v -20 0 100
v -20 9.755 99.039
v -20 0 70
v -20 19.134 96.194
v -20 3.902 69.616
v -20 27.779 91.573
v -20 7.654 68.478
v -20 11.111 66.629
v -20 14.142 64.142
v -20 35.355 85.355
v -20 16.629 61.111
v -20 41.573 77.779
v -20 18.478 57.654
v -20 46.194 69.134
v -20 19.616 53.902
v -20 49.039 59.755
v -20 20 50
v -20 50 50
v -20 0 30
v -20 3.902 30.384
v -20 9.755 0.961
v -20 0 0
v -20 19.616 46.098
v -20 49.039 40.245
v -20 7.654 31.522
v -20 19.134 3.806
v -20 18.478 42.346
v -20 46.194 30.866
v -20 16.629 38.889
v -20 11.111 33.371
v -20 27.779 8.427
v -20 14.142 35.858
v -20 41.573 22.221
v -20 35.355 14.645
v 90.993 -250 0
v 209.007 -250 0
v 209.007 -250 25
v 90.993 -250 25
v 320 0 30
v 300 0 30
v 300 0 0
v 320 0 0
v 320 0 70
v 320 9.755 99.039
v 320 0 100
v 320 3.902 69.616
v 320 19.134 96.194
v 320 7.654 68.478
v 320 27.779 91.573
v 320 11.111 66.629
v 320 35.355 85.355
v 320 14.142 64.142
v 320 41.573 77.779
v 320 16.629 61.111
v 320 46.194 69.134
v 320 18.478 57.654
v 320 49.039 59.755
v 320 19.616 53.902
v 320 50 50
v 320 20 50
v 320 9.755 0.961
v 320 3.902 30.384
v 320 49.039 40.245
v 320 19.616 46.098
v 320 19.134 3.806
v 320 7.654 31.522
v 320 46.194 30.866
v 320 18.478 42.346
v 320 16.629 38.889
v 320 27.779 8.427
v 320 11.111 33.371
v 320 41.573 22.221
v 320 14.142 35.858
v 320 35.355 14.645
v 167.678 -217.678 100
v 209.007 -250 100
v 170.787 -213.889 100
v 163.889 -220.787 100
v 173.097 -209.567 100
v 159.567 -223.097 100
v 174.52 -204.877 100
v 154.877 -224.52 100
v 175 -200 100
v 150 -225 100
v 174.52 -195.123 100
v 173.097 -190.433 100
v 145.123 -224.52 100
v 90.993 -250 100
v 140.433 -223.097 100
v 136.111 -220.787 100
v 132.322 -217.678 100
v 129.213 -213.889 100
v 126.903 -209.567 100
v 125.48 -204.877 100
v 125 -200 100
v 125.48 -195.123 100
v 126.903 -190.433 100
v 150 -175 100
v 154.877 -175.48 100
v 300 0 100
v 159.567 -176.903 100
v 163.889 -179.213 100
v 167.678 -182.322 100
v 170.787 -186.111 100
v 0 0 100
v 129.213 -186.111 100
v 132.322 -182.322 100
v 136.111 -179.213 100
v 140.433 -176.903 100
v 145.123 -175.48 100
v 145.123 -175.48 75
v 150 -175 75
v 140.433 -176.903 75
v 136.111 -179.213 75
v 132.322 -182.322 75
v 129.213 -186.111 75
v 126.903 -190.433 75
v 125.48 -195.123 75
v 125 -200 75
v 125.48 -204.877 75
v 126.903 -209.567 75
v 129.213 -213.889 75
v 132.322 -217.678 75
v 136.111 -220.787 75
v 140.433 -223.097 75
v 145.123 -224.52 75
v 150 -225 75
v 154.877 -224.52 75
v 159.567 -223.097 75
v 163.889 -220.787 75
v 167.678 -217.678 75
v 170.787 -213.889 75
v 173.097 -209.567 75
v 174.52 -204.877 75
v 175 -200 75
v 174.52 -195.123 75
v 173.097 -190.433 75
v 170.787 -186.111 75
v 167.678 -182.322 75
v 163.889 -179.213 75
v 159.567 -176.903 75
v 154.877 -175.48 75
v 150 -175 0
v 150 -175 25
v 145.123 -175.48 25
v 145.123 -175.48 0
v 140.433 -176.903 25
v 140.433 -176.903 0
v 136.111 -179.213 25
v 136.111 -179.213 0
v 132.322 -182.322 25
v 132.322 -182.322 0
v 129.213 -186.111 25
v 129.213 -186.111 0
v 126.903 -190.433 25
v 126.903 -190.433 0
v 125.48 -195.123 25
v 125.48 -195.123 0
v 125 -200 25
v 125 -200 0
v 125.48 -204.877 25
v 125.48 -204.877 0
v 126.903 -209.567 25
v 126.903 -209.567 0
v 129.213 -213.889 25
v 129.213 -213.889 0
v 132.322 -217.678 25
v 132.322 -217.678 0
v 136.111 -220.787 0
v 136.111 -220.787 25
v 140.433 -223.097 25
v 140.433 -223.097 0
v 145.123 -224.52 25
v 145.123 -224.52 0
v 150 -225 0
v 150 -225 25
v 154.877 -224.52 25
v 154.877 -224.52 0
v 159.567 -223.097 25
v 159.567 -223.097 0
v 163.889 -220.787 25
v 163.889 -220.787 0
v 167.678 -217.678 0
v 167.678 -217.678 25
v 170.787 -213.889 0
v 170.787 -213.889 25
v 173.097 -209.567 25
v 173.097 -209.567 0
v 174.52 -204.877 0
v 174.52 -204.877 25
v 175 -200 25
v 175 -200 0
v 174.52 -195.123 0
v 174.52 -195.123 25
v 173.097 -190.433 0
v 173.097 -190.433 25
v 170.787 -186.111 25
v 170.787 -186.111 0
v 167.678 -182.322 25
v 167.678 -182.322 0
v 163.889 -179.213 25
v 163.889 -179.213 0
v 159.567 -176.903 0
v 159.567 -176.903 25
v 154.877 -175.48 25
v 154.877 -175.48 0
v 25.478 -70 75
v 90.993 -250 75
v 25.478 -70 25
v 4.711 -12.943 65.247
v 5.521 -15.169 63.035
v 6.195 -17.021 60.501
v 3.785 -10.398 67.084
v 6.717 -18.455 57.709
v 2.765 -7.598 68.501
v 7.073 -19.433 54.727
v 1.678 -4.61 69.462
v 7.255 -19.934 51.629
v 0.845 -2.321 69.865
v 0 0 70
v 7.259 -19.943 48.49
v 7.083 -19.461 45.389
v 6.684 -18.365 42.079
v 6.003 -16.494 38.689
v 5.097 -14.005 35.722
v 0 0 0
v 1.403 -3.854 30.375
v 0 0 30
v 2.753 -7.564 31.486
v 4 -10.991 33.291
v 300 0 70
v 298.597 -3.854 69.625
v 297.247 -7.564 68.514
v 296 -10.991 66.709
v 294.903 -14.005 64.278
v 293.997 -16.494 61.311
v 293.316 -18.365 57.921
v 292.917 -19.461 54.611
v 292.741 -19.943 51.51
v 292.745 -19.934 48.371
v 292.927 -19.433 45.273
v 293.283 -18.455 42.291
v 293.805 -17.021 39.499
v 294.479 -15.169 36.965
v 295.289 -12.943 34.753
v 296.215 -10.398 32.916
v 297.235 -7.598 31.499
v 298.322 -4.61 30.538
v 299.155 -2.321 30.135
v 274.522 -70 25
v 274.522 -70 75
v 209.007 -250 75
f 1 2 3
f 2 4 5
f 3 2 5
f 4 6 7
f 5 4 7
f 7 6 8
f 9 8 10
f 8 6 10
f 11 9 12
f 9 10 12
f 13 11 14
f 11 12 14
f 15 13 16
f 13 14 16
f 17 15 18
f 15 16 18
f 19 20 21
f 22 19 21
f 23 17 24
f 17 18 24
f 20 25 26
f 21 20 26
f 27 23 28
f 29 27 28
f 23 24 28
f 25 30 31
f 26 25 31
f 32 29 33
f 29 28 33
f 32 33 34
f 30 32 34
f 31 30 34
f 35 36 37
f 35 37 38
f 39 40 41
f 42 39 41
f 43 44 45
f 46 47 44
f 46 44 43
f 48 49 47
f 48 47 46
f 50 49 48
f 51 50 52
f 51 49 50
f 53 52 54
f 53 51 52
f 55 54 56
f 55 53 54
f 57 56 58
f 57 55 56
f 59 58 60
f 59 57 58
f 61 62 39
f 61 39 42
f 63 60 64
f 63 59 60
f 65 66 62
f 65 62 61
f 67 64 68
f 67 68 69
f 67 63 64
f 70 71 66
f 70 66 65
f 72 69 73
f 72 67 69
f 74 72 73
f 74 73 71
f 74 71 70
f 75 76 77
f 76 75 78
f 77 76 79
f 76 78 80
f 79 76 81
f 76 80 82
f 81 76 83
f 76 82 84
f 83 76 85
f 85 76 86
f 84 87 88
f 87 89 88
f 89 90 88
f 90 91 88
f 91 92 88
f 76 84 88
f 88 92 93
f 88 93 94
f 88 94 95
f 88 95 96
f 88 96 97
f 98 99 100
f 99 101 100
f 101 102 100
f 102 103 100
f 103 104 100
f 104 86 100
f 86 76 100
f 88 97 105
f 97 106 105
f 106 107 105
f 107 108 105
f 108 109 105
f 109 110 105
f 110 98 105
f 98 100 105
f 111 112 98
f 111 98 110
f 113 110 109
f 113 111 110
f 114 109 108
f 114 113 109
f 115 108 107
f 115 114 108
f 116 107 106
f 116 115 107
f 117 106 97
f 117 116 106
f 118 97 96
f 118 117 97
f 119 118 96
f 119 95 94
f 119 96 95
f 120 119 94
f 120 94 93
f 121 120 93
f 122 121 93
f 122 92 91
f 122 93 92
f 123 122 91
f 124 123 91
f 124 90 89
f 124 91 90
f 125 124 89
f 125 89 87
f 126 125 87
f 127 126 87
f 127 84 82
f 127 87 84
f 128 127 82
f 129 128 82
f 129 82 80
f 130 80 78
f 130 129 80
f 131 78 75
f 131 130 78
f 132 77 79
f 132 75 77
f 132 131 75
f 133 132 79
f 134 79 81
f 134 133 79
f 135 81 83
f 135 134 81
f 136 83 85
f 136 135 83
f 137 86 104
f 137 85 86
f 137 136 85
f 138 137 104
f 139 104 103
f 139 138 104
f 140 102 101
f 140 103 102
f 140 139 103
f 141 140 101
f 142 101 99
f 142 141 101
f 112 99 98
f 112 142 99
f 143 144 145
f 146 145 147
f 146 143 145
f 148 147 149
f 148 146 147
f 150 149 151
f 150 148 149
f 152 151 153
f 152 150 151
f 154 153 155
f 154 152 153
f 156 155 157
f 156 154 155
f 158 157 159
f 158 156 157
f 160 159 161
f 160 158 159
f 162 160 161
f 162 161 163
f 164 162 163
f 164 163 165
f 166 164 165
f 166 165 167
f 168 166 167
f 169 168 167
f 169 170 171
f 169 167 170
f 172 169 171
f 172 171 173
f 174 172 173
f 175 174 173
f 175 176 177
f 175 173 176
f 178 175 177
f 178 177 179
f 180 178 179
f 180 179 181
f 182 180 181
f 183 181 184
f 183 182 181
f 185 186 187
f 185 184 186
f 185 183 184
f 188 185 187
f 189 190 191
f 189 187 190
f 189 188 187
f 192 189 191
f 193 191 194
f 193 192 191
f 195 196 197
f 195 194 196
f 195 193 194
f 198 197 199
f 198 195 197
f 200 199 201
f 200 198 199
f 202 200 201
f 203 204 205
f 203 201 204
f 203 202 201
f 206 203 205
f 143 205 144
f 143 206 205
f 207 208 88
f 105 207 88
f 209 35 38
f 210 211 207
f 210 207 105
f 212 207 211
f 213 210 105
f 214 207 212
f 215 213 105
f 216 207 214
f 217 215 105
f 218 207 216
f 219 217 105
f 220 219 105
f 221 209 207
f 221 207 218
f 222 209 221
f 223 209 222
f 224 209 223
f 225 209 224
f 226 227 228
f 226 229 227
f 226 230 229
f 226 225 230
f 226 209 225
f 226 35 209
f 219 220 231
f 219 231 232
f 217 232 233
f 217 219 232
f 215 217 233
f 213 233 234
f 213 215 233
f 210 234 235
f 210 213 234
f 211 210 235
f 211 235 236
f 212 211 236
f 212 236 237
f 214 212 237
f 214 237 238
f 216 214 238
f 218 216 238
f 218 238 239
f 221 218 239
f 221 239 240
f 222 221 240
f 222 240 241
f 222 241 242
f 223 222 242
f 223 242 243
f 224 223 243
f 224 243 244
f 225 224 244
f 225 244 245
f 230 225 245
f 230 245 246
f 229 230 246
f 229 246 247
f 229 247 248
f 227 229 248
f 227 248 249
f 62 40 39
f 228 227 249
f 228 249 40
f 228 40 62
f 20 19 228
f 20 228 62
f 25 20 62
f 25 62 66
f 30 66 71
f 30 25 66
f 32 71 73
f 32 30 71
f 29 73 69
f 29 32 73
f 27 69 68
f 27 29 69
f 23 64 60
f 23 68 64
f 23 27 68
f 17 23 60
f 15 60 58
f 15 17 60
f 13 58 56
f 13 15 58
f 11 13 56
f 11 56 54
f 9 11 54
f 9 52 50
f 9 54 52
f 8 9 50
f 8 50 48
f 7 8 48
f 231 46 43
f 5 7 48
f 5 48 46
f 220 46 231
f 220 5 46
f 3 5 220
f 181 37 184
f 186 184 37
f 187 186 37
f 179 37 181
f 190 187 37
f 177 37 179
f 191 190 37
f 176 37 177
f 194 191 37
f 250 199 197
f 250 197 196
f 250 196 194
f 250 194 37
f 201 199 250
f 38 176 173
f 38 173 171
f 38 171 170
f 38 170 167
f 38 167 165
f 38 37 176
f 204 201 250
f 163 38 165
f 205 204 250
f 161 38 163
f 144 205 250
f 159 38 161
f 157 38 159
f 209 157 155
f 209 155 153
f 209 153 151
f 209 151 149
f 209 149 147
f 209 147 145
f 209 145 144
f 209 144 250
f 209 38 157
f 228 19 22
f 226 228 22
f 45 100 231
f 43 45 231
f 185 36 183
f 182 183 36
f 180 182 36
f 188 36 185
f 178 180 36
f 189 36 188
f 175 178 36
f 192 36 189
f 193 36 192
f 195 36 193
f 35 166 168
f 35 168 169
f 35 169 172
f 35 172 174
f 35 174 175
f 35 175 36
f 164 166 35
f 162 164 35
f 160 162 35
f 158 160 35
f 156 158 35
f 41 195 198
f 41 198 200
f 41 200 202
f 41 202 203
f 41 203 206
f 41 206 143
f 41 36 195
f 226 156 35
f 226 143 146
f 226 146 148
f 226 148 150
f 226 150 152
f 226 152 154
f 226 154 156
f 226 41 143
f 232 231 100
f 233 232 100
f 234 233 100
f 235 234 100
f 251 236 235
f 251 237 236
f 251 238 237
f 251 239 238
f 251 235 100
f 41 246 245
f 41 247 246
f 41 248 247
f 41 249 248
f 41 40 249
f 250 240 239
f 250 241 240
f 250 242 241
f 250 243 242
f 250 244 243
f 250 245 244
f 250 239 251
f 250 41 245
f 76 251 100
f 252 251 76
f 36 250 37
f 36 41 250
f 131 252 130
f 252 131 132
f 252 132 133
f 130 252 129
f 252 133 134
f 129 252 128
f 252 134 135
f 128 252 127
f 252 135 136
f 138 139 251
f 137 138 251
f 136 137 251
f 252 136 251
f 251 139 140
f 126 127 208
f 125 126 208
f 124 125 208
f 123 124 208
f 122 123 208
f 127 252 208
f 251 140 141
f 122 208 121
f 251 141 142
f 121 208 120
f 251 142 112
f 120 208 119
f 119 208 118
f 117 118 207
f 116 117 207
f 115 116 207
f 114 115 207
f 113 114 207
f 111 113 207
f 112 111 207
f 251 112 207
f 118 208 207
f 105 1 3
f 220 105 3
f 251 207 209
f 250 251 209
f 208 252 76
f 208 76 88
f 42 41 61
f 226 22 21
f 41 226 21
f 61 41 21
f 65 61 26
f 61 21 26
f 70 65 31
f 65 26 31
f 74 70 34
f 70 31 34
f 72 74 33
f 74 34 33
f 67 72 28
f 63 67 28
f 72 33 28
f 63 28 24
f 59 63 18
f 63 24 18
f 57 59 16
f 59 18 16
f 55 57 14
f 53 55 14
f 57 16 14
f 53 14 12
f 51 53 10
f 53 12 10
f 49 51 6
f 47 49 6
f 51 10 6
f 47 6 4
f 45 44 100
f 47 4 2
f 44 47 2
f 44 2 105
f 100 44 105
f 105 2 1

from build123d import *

# Parameters (mm, degrees)
BOSS_EXTRUDE1_DEPTH      = 100
BOSS_EXTRUDE2_DEPTH      = 320
BOSS_EXTRUDE2_DEPTH_BACK = 20
CUT_EXTRUDE1_DEPTH       = 419.210473327
CUT_EXTRUDE1_DEPTH_BACK  = 419.210473327
SKETCH3_3_R              = 20
CUT_EXTRUDE2_DEPTH       = 419.210473327
CUT_EXTRUDE2_DEPTH_BACK  = 419.210473327
SKETCH4_W                = 50
SKETCH4_H                = 180
SKETCH5_R                = 25
CUT_EXTRUDE5_DEPTH       = 419.210473327


with BuildPart() as part:
    # Sketch2 → Boss-Extrude1 (new body)
    with BuildSketch(Plane.XY):
        Polygon((0, 0), (300, 0), (209.007441433, -250), (90.992558567, -250), align=None)
    extrude(amount=BOSS_EXTRUDE1_DEPTH)

    # Sketch3 → Boss-Extrude2 (add, two sides: drawn at the far end of the back side and taken through both)
    with BuildSketch(Plane(origin=(0, 0, 0), x_dir=(0, 0, -1), z_dir=(1, 0, 0)).offset(-BOSS_EXTRUDE2_DEPTH_BACK)):
        with BuildLine():
            Line((-30, 0), (0, 0))
            ThreePointArc((0, 0), (-50, 50), (-100, 0))
            Line((-100, 0), (-70, 0))
            ThreePointArc((-70, 0), (-50, -20), (-30, 0))
        make_face()
    extrude(amount=BOSS_EXTRUDE2_DEPTH + BOSS_EXTRUDE2_DEPTH_BACK)

    # Sketch3<3> → Cut-Extrude1 (cut, two sides: drawn at the far end of the back side and taken through both)
    with BuildSketch(Plane(origin=(0, 0, 0), x_dir=(0, 0, -1), z_dir=(1, 0, 0)).offset(-CUT_EXTRUDE1_DEPTH_BACK)):
        with Locations((-50, 0)):
            Circle(SKETCH3_3_R)
    extrude(amount=CUT_EXTRUDE1_DEPTH + CUT_EXTRUDE1_DEPTH_BACK, mode=Mode.SUBTRACT)

    # Sketch4 → Cut-Extrude2 (cut, two sides: drawn at the far end of the back side and taken through both)
    with BuildSketch(Plane(origin=(0, 0, 0), x_dir=(0, 0, -1), z_dir=(1, 0, 0)).offset(-CUT_EXTRUDE2_DEPTH_BACK)):
        with Locations((-50, -160)):
            Rectangle(SKETCH4_W, SKETCH4_H)
    extrude(amount=CUT_EXTRUDE2_DEPTH + CUT_EXTRUDE2_DEPTH_BACK, mode=Mode.SUBTRACT)

    # Sketch5 → Cut-Extrude5 (cut, through all)
    with BuildSketch(Plane.XY):
        with Locations((150, -200)):
            Circle(SKETCH5_R)
    extrude(amount=CUT_EXTRUDE5_DEPTH, mode=Mode.SUBTRACT)


solid = part.part
